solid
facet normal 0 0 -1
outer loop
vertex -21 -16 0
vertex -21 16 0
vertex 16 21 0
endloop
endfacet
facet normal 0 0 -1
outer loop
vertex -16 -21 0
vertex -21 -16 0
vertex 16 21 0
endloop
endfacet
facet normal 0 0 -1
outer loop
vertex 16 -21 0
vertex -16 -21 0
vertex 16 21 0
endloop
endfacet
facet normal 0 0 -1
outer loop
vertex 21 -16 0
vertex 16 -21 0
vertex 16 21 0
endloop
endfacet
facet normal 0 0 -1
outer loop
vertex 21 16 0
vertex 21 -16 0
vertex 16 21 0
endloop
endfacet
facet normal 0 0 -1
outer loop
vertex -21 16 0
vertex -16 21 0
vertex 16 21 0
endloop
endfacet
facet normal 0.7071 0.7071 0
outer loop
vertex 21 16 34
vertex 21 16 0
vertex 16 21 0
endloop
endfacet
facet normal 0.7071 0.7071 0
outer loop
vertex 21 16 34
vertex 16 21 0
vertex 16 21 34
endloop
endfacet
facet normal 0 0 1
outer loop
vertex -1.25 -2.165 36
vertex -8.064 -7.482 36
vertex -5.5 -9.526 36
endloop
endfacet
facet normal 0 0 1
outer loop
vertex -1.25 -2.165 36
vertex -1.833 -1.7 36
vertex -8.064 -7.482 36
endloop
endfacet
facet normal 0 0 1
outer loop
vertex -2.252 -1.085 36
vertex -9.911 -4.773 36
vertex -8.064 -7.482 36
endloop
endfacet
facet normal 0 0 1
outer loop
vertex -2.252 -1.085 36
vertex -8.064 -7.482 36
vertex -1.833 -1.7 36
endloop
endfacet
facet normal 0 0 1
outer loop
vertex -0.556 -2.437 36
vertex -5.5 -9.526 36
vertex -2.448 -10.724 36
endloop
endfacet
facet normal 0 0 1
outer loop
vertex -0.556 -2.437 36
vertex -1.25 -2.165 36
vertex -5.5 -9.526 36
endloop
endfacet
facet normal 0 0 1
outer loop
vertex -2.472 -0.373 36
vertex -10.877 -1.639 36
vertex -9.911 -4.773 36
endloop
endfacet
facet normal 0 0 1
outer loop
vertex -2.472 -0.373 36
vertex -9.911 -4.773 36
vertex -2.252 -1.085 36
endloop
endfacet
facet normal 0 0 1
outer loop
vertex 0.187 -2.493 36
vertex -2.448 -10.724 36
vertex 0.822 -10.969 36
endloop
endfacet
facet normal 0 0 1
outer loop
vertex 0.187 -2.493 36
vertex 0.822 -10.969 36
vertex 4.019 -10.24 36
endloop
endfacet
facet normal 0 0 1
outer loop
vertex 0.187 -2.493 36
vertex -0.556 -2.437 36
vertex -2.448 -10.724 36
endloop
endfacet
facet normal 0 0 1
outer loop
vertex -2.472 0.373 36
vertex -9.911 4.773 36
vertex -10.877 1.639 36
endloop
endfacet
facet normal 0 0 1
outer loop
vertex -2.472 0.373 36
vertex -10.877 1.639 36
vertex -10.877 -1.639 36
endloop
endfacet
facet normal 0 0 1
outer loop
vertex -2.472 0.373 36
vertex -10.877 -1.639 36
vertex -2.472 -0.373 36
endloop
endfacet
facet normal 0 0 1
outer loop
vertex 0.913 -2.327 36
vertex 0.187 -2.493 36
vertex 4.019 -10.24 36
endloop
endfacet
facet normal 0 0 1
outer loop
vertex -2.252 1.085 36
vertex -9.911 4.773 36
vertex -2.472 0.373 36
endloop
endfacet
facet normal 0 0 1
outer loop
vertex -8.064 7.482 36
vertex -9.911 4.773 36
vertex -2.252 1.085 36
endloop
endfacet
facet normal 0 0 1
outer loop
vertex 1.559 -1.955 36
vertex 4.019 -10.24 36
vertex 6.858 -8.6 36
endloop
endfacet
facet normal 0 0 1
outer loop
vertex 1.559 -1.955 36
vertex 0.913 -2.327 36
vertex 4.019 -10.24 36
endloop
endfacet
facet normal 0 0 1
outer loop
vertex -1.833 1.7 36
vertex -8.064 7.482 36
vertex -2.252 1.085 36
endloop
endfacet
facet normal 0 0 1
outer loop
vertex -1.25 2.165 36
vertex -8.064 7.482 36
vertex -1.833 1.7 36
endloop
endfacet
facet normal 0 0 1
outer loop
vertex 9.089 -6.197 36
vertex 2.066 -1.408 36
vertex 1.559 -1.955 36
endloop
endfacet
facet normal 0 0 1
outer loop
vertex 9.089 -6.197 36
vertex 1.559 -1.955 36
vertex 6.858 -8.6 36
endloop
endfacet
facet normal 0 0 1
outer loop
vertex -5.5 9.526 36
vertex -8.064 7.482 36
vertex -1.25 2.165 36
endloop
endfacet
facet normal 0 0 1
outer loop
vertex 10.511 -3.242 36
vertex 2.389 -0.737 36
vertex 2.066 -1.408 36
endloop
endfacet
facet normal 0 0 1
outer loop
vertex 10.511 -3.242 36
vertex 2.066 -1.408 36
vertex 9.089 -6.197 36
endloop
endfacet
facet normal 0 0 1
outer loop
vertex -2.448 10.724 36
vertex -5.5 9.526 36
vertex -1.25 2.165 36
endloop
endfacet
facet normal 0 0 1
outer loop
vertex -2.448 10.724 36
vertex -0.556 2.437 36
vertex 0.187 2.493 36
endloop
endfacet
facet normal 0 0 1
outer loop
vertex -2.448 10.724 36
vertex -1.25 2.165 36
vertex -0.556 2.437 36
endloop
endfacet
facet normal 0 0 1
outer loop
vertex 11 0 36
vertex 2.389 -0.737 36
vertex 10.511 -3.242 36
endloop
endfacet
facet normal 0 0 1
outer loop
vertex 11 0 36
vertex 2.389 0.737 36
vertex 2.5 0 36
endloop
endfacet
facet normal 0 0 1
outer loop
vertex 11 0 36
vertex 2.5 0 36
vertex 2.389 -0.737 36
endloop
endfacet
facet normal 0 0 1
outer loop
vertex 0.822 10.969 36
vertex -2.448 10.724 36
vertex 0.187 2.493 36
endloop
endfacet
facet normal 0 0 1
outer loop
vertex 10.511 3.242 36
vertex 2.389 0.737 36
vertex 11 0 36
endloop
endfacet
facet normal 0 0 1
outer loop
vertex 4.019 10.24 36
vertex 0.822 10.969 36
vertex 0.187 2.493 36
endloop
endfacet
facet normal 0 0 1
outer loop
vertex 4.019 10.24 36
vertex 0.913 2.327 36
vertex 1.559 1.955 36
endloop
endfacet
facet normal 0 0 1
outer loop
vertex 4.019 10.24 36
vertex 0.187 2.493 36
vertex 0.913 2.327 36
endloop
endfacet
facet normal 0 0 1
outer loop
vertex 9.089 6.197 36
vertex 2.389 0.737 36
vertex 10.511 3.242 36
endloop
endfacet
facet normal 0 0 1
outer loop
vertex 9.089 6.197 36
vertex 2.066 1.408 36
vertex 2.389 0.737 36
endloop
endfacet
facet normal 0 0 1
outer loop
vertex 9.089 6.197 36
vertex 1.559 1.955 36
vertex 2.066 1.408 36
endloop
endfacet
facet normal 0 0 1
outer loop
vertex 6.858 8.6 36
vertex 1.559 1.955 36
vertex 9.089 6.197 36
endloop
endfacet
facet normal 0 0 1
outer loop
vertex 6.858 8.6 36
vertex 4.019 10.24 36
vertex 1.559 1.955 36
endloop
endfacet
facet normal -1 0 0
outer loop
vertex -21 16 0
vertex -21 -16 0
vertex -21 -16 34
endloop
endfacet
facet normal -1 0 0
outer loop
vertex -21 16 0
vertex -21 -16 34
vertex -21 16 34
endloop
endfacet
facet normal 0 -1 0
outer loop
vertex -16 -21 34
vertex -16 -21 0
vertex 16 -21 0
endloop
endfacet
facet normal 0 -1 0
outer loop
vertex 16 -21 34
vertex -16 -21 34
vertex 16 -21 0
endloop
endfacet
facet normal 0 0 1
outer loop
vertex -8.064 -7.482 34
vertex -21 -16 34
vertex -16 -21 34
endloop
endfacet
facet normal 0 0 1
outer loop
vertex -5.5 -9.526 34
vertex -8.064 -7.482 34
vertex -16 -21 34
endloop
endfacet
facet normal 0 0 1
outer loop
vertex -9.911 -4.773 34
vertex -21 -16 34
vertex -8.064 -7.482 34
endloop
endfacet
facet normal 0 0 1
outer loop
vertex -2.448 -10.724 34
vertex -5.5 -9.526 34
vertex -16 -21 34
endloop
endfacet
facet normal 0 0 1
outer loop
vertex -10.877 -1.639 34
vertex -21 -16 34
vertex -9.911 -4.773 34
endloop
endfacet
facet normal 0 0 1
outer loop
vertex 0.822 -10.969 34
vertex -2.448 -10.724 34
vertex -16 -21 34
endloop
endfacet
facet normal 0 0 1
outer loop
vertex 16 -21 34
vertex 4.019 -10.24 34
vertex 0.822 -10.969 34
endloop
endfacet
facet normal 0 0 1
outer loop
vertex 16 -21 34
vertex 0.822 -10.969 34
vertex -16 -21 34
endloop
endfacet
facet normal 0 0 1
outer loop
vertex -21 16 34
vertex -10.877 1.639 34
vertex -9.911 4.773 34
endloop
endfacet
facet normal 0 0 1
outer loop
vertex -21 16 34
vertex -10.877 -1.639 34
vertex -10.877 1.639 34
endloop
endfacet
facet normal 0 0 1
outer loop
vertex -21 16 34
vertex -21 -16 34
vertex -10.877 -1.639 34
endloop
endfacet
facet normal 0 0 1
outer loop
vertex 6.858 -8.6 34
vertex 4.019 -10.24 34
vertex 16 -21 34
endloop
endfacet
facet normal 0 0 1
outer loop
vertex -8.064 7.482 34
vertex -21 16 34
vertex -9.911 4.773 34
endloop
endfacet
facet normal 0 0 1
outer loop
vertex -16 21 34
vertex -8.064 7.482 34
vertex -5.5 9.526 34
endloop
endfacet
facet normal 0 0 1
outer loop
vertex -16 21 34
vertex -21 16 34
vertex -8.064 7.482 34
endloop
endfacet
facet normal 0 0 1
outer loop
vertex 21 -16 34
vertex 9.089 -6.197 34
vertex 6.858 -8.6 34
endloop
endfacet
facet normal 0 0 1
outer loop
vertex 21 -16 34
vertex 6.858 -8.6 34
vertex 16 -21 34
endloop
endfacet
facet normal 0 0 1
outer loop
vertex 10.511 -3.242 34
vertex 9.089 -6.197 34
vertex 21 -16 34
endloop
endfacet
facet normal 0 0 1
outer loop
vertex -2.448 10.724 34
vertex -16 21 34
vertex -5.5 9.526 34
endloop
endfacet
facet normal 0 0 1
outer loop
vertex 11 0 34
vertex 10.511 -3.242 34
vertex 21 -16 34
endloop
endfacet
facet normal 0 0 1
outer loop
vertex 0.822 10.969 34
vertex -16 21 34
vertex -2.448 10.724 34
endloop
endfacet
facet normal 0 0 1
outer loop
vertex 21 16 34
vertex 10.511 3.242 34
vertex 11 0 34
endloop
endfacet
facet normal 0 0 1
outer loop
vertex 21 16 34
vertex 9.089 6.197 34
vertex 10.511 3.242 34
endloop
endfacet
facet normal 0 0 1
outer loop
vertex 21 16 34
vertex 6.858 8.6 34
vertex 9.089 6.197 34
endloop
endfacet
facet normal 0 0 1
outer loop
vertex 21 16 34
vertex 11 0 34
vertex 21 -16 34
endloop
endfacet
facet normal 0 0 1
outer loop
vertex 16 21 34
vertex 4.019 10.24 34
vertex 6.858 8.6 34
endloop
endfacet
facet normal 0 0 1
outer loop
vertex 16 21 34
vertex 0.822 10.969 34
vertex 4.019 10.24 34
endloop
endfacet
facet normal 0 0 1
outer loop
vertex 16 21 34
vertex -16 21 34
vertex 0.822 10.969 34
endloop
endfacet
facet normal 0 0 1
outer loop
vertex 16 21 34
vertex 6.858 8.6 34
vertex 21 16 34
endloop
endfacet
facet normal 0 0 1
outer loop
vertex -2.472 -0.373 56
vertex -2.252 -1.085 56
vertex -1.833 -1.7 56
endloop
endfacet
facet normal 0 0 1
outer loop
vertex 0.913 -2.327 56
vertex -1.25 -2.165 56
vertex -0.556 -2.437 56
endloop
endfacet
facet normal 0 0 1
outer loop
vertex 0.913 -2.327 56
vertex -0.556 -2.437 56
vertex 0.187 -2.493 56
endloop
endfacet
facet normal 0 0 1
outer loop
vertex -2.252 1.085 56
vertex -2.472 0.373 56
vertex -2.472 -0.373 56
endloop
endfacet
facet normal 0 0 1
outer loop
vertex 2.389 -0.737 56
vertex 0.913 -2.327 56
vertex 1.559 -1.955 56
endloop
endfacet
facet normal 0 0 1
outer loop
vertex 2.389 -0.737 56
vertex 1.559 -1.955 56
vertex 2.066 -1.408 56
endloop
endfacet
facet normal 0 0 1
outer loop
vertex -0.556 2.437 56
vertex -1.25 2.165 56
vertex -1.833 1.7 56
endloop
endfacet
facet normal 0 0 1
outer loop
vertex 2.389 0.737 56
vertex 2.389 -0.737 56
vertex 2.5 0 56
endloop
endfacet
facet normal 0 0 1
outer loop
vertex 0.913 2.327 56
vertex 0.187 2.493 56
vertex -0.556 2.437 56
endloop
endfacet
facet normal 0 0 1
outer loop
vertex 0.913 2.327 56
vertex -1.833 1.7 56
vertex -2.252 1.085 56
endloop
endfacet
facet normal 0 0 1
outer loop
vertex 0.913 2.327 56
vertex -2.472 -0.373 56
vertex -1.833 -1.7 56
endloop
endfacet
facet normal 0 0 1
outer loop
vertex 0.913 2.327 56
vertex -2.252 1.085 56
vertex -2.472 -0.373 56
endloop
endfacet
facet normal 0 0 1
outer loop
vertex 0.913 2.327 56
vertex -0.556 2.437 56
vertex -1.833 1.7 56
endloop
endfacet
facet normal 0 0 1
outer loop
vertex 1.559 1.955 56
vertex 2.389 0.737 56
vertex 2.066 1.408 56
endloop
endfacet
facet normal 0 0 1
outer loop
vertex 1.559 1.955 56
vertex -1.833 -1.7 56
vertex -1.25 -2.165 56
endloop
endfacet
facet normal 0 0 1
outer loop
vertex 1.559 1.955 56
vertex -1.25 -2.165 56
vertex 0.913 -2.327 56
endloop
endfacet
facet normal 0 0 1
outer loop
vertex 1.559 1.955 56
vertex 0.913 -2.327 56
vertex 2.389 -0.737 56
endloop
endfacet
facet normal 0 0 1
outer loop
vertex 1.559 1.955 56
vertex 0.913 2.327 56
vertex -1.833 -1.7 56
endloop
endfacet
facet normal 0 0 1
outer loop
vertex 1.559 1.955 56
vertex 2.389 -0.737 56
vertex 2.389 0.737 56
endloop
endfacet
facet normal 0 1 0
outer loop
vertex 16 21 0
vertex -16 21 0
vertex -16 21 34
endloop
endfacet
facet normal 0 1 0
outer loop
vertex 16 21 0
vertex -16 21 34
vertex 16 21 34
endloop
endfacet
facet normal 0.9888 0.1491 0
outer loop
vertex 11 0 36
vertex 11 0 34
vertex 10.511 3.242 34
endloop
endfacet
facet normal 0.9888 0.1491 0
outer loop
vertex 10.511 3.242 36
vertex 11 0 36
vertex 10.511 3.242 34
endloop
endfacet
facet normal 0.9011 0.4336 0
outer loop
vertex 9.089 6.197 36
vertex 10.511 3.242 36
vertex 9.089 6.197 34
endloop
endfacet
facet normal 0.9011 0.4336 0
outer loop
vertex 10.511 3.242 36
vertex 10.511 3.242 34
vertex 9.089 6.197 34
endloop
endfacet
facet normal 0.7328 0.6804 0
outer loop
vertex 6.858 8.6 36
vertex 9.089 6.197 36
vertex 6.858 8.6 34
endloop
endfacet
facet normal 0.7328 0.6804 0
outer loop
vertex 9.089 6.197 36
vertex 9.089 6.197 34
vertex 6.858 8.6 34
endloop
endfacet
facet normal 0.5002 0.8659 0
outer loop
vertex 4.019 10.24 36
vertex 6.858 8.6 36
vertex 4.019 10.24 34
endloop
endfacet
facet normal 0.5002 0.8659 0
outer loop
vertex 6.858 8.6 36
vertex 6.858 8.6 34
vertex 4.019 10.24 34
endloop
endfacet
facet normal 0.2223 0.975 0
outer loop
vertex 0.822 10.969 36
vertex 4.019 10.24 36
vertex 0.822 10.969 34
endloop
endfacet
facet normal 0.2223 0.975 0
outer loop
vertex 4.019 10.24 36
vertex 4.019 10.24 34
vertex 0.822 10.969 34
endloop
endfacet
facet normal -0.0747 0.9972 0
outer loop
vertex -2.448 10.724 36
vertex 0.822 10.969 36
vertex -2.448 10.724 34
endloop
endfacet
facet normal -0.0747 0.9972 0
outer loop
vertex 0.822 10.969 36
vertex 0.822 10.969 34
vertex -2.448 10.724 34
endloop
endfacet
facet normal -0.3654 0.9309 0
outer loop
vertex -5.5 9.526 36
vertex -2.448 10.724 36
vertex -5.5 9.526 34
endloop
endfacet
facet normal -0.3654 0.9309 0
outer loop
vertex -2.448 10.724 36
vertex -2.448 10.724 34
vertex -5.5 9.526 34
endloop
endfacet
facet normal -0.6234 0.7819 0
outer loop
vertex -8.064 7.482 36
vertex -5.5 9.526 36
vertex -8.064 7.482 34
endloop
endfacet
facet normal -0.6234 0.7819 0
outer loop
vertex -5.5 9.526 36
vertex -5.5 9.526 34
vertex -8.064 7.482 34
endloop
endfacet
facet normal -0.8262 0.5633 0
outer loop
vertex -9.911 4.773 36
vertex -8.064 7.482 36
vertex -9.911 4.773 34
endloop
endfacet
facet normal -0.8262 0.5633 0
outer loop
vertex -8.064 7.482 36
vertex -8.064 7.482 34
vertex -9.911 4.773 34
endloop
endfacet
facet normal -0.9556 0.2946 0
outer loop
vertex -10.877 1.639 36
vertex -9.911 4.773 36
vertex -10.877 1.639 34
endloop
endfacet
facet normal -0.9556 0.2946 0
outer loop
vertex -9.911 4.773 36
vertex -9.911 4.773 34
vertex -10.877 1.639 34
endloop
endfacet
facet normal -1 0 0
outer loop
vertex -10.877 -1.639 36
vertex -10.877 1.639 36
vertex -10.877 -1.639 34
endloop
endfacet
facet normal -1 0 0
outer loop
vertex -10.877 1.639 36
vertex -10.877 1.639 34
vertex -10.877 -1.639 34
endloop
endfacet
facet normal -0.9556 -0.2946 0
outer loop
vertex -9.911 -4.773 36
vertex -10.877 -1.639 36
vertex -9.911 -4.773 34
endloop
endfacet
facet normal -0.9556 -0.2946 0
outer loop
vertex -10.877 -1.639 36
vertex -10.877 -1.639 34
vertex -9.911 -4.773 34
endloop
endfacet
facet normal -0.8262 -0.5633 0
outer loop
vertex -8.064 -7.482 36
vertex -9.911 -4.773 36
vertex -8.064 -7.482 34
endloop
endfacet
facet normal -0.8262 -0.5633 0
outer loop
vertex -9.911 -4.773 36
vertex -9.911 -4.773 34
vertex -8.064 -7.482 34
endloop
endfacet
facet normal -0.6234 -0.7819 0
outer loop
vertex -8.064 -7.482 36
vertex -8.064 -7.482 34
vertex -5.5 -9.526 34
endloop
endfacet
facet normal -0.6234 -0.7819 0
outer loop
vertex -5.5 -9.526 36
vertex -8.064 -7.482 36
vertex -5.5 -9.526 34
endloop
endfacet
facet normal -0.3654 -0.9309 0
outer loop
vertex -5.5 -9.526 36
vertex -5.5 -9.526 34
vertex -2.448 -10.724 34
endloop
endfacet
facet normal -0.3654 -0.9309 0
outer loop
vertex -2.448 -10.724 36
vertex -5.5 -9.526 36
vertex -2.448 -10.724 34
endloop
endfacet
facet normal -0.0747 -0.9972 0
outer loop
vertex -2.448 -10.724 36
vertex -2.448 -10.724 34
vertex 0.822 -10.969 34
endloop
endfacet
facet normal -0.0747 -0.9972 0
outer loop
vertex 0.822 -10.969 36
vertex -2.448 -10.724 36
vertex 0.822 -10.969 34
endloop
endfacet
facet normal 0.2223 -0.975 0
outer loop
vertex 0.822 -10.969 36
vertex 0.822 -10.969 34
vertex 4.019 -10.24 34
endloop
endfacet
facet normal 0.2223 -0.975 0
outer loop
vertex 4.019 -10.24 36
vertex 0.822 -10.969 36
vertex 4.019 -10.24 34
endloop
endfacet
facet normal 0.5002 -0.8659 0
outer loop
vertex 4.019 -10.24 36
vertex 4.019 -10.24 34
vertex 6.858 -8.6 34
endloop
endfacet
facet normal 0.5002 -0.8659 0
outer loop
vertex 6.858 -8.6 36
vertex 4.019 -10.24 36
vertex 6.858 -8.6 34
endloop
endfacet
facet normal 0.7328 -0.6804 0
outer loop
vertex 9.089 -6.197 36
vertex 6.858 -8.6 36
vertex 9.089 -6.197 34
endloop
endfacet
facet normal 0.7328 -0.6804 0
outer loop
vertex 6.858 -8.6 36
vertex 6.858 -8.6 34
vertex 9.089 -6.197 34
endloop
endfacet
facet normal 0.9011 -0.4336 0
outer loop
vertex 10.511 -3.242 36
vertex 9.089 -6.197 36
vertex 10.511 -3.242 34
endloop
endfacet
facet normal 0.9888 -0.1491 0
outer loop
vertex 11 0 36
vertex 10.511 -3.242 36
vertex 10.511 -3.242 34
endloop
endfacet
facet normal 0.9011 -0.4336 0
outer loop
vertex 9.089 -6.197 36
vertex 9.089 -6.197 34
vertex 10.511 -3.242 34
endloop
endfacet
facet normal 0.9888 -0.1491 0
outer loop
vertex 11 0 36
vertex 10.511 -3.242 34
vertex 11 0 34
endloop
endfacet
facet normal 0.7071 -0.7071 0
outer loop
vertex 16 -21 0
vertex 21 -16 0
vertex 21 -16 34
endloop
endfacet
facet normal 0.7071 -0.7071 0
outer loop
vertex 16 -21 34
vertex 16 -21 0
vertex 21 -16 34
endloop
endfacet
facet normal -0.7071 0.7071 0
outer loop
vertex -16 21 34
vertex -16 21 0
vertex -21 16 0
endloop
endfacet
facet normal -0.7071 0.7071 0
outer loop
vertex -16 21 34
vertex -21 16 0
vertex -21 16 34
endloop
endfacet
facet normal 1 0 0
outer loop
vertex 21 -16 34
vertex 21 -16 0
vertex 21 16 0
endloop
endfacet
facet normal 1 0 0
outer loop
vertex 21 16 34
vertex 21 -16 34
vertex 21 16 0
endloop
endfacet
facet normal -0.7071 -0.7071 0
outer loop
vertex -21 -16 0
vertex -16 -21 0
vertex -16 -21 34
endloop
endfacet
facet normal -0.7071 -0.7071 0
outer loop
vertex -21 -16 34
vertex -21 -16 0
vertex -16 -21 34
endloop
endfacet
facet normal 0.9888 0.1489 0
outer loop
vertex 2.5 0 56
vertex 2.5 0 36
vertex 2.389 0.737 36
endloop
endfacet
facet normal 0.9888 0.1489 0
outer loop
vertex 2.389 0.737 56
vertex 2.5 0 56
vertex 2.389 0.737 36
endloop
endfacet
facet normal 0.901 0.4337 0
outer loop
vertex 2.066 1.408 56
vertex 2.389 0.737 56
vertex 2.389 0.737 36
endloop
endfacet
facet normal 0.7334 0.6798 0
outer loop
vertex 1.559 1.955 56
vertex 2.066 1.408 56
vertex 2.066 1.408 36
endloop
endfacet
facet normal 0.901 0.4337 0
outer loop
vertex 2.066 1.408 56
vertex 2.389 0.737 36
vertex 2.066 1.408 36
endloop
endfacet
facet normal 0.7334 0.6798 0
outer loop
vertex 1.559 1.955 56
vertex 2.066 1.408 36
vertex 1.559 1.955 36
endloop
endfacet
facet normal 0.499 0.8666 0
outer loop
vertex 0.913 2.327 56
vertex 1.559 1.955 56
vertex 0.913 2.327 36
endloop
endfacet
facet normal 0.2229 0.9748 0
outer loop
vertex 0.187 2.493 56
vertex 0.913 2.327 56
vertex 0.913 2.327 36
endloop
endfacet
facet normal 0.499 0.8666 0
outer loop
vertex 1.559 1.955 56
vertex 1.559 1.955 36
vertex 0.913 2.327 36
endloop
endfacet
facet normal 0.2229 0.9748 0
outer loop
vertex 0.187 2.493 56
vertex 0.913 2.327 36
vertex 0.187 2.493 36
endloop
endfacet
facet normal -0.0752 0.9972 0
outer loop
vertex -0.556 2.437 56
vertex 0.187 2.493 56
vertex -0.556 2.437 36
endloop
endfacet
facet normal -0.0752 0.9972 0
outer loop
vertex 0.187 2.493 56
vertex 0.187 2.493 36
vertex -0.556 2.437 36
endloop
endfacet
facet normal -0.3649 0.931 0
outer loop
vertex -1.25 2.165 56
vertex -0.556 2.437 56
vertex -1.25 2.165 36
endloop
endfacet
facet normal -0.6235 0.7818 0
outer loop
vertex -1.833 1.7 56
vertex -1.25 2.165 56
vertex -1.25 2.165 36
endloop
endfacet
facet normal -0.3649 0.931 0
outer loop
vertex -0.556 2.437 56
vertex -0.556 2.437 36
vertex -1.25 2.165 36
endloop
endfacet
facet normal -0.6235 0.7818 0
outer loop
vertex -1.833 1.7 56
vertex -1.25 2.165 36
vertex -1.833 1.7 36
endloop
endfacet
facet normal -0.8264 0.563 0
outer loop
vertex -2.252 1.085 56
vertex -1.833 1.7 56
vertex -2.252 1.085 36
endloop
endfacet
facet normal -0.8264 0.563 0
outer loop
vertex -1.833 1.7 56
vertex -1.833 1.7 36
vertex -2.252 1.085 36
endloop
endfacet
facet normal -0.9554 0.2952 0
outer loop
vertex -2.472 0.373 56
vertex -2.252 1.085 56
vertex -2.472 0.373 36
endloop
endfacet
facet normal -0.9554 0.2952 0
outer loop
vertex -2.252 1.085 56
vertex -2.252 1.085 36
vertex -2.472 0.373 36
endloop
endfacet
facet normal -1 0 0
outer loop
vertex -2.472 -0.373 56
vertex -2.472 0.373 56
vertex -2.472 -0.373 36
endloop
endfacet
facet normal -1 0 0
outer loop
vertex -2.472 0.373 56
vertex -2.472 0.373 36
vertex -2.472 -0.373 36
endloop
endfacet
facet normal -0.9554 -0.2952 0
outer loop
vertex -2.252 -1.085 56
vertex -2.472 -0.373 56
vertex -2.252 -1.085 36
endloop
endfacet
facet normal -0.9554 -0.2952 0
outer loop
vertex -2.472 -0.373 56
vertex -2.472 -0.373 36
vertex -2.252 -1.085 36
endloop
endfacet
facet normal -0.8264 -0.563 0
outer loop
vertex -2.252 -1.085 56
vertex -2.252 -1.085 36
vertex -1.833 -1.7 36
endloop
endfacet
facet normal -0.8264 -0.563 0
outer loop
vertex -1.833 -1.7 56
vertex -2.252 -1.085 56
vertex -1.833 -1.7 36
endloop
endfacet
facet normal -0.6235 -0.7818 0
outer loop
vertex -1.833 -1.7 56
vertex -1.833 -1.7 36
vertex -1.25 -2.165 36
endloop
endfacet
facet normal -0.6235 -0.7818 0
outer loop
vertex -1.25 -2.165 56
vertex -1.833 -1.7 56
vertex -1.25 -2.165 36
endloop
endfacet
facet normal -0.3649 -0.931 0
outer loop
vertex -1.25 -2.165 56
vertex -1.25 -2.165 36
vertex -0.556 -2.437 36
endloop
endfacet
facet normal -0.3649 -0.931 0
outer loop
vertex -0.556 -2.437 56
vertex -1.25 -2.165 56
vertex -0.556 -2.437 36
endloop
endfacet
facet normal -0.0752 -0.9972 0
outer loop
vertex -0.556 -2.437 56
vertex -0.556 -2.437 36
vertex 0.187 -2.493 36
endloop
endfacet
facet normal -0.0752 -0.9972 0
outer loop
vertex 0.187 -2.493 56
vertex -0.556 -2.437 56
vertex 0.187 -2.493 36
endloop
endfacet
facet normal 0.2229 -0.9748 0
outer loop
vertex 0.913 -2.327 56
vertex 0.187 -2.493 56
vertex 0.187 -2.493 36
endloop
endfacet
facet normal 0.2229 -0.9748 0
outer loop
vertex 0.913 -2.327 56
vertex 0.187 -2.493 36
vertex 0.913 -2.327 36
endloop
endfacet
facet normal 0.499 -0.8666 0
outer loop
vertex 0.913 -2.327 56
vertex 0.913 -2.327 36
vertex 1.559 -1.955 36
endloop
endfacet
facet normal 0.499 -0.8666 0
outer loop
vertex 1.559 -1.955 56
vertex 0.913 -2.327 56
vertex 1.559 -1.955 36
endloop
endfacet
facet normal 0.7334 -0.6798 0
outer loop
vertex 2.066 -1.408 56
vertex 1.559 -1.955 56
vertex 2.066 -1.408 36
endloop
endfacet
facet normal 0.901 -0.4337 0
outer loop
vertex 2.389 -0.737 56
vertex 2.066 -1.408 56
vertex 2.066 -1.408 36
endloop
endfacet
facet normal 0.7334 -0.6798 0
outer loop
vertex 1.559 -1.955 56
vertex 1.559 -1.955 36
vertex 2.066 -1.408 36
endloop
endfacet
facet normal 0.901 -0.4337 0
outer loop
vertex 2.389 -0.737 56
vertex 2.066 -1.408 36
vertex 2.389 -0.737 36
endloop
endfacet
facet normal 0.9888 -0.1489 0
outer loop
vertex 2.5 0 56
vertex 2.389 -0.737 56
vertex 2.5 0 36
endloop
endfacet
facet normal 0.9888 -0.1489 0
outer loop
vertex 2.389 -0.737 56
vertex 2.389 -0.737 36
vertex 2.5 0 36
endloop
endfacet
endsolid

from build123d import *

# Parameters (mm, degrees)
F0_W     = 42
F0_H     = 42
F1_DEPTH = 34
F2_R     = 11
F3_DEPTH = 2
F4_R     = 2.5
F5_DEPTH = 20
F6_SIZE  = 5


with BuildPart() as f1:
    # F0 (on Top) → F1 (new body)
    with BuildSketch(Plane.XY):
        Rectangle(F0_W, F0_H)
    extrude(amount=F1_DEPTH)

    # F2 (on face) → F3 (join)
    with BuildSketch(Plane.XY.offset(34)):
        Circle(F2_R)
    extrude(amount=F3_DEPTH)

    # F4 (on face) → F5 (join)
    with BuildSketch(Plane.XY.offset(36)):
        Circle(F4_R)
    extrude(amount=F5_DEPTH)

    # F6
    f6_edges = [f1.edges().sort_by_distance(p)[0] for p in [
        (-21, 21, 17),
        (21, 21, 17),
        (21, -21, 17),
        (-21, -21, 17),
    ]]
    chamfer(f6_edges, length=F6_SIZE)


solid = f1.part
